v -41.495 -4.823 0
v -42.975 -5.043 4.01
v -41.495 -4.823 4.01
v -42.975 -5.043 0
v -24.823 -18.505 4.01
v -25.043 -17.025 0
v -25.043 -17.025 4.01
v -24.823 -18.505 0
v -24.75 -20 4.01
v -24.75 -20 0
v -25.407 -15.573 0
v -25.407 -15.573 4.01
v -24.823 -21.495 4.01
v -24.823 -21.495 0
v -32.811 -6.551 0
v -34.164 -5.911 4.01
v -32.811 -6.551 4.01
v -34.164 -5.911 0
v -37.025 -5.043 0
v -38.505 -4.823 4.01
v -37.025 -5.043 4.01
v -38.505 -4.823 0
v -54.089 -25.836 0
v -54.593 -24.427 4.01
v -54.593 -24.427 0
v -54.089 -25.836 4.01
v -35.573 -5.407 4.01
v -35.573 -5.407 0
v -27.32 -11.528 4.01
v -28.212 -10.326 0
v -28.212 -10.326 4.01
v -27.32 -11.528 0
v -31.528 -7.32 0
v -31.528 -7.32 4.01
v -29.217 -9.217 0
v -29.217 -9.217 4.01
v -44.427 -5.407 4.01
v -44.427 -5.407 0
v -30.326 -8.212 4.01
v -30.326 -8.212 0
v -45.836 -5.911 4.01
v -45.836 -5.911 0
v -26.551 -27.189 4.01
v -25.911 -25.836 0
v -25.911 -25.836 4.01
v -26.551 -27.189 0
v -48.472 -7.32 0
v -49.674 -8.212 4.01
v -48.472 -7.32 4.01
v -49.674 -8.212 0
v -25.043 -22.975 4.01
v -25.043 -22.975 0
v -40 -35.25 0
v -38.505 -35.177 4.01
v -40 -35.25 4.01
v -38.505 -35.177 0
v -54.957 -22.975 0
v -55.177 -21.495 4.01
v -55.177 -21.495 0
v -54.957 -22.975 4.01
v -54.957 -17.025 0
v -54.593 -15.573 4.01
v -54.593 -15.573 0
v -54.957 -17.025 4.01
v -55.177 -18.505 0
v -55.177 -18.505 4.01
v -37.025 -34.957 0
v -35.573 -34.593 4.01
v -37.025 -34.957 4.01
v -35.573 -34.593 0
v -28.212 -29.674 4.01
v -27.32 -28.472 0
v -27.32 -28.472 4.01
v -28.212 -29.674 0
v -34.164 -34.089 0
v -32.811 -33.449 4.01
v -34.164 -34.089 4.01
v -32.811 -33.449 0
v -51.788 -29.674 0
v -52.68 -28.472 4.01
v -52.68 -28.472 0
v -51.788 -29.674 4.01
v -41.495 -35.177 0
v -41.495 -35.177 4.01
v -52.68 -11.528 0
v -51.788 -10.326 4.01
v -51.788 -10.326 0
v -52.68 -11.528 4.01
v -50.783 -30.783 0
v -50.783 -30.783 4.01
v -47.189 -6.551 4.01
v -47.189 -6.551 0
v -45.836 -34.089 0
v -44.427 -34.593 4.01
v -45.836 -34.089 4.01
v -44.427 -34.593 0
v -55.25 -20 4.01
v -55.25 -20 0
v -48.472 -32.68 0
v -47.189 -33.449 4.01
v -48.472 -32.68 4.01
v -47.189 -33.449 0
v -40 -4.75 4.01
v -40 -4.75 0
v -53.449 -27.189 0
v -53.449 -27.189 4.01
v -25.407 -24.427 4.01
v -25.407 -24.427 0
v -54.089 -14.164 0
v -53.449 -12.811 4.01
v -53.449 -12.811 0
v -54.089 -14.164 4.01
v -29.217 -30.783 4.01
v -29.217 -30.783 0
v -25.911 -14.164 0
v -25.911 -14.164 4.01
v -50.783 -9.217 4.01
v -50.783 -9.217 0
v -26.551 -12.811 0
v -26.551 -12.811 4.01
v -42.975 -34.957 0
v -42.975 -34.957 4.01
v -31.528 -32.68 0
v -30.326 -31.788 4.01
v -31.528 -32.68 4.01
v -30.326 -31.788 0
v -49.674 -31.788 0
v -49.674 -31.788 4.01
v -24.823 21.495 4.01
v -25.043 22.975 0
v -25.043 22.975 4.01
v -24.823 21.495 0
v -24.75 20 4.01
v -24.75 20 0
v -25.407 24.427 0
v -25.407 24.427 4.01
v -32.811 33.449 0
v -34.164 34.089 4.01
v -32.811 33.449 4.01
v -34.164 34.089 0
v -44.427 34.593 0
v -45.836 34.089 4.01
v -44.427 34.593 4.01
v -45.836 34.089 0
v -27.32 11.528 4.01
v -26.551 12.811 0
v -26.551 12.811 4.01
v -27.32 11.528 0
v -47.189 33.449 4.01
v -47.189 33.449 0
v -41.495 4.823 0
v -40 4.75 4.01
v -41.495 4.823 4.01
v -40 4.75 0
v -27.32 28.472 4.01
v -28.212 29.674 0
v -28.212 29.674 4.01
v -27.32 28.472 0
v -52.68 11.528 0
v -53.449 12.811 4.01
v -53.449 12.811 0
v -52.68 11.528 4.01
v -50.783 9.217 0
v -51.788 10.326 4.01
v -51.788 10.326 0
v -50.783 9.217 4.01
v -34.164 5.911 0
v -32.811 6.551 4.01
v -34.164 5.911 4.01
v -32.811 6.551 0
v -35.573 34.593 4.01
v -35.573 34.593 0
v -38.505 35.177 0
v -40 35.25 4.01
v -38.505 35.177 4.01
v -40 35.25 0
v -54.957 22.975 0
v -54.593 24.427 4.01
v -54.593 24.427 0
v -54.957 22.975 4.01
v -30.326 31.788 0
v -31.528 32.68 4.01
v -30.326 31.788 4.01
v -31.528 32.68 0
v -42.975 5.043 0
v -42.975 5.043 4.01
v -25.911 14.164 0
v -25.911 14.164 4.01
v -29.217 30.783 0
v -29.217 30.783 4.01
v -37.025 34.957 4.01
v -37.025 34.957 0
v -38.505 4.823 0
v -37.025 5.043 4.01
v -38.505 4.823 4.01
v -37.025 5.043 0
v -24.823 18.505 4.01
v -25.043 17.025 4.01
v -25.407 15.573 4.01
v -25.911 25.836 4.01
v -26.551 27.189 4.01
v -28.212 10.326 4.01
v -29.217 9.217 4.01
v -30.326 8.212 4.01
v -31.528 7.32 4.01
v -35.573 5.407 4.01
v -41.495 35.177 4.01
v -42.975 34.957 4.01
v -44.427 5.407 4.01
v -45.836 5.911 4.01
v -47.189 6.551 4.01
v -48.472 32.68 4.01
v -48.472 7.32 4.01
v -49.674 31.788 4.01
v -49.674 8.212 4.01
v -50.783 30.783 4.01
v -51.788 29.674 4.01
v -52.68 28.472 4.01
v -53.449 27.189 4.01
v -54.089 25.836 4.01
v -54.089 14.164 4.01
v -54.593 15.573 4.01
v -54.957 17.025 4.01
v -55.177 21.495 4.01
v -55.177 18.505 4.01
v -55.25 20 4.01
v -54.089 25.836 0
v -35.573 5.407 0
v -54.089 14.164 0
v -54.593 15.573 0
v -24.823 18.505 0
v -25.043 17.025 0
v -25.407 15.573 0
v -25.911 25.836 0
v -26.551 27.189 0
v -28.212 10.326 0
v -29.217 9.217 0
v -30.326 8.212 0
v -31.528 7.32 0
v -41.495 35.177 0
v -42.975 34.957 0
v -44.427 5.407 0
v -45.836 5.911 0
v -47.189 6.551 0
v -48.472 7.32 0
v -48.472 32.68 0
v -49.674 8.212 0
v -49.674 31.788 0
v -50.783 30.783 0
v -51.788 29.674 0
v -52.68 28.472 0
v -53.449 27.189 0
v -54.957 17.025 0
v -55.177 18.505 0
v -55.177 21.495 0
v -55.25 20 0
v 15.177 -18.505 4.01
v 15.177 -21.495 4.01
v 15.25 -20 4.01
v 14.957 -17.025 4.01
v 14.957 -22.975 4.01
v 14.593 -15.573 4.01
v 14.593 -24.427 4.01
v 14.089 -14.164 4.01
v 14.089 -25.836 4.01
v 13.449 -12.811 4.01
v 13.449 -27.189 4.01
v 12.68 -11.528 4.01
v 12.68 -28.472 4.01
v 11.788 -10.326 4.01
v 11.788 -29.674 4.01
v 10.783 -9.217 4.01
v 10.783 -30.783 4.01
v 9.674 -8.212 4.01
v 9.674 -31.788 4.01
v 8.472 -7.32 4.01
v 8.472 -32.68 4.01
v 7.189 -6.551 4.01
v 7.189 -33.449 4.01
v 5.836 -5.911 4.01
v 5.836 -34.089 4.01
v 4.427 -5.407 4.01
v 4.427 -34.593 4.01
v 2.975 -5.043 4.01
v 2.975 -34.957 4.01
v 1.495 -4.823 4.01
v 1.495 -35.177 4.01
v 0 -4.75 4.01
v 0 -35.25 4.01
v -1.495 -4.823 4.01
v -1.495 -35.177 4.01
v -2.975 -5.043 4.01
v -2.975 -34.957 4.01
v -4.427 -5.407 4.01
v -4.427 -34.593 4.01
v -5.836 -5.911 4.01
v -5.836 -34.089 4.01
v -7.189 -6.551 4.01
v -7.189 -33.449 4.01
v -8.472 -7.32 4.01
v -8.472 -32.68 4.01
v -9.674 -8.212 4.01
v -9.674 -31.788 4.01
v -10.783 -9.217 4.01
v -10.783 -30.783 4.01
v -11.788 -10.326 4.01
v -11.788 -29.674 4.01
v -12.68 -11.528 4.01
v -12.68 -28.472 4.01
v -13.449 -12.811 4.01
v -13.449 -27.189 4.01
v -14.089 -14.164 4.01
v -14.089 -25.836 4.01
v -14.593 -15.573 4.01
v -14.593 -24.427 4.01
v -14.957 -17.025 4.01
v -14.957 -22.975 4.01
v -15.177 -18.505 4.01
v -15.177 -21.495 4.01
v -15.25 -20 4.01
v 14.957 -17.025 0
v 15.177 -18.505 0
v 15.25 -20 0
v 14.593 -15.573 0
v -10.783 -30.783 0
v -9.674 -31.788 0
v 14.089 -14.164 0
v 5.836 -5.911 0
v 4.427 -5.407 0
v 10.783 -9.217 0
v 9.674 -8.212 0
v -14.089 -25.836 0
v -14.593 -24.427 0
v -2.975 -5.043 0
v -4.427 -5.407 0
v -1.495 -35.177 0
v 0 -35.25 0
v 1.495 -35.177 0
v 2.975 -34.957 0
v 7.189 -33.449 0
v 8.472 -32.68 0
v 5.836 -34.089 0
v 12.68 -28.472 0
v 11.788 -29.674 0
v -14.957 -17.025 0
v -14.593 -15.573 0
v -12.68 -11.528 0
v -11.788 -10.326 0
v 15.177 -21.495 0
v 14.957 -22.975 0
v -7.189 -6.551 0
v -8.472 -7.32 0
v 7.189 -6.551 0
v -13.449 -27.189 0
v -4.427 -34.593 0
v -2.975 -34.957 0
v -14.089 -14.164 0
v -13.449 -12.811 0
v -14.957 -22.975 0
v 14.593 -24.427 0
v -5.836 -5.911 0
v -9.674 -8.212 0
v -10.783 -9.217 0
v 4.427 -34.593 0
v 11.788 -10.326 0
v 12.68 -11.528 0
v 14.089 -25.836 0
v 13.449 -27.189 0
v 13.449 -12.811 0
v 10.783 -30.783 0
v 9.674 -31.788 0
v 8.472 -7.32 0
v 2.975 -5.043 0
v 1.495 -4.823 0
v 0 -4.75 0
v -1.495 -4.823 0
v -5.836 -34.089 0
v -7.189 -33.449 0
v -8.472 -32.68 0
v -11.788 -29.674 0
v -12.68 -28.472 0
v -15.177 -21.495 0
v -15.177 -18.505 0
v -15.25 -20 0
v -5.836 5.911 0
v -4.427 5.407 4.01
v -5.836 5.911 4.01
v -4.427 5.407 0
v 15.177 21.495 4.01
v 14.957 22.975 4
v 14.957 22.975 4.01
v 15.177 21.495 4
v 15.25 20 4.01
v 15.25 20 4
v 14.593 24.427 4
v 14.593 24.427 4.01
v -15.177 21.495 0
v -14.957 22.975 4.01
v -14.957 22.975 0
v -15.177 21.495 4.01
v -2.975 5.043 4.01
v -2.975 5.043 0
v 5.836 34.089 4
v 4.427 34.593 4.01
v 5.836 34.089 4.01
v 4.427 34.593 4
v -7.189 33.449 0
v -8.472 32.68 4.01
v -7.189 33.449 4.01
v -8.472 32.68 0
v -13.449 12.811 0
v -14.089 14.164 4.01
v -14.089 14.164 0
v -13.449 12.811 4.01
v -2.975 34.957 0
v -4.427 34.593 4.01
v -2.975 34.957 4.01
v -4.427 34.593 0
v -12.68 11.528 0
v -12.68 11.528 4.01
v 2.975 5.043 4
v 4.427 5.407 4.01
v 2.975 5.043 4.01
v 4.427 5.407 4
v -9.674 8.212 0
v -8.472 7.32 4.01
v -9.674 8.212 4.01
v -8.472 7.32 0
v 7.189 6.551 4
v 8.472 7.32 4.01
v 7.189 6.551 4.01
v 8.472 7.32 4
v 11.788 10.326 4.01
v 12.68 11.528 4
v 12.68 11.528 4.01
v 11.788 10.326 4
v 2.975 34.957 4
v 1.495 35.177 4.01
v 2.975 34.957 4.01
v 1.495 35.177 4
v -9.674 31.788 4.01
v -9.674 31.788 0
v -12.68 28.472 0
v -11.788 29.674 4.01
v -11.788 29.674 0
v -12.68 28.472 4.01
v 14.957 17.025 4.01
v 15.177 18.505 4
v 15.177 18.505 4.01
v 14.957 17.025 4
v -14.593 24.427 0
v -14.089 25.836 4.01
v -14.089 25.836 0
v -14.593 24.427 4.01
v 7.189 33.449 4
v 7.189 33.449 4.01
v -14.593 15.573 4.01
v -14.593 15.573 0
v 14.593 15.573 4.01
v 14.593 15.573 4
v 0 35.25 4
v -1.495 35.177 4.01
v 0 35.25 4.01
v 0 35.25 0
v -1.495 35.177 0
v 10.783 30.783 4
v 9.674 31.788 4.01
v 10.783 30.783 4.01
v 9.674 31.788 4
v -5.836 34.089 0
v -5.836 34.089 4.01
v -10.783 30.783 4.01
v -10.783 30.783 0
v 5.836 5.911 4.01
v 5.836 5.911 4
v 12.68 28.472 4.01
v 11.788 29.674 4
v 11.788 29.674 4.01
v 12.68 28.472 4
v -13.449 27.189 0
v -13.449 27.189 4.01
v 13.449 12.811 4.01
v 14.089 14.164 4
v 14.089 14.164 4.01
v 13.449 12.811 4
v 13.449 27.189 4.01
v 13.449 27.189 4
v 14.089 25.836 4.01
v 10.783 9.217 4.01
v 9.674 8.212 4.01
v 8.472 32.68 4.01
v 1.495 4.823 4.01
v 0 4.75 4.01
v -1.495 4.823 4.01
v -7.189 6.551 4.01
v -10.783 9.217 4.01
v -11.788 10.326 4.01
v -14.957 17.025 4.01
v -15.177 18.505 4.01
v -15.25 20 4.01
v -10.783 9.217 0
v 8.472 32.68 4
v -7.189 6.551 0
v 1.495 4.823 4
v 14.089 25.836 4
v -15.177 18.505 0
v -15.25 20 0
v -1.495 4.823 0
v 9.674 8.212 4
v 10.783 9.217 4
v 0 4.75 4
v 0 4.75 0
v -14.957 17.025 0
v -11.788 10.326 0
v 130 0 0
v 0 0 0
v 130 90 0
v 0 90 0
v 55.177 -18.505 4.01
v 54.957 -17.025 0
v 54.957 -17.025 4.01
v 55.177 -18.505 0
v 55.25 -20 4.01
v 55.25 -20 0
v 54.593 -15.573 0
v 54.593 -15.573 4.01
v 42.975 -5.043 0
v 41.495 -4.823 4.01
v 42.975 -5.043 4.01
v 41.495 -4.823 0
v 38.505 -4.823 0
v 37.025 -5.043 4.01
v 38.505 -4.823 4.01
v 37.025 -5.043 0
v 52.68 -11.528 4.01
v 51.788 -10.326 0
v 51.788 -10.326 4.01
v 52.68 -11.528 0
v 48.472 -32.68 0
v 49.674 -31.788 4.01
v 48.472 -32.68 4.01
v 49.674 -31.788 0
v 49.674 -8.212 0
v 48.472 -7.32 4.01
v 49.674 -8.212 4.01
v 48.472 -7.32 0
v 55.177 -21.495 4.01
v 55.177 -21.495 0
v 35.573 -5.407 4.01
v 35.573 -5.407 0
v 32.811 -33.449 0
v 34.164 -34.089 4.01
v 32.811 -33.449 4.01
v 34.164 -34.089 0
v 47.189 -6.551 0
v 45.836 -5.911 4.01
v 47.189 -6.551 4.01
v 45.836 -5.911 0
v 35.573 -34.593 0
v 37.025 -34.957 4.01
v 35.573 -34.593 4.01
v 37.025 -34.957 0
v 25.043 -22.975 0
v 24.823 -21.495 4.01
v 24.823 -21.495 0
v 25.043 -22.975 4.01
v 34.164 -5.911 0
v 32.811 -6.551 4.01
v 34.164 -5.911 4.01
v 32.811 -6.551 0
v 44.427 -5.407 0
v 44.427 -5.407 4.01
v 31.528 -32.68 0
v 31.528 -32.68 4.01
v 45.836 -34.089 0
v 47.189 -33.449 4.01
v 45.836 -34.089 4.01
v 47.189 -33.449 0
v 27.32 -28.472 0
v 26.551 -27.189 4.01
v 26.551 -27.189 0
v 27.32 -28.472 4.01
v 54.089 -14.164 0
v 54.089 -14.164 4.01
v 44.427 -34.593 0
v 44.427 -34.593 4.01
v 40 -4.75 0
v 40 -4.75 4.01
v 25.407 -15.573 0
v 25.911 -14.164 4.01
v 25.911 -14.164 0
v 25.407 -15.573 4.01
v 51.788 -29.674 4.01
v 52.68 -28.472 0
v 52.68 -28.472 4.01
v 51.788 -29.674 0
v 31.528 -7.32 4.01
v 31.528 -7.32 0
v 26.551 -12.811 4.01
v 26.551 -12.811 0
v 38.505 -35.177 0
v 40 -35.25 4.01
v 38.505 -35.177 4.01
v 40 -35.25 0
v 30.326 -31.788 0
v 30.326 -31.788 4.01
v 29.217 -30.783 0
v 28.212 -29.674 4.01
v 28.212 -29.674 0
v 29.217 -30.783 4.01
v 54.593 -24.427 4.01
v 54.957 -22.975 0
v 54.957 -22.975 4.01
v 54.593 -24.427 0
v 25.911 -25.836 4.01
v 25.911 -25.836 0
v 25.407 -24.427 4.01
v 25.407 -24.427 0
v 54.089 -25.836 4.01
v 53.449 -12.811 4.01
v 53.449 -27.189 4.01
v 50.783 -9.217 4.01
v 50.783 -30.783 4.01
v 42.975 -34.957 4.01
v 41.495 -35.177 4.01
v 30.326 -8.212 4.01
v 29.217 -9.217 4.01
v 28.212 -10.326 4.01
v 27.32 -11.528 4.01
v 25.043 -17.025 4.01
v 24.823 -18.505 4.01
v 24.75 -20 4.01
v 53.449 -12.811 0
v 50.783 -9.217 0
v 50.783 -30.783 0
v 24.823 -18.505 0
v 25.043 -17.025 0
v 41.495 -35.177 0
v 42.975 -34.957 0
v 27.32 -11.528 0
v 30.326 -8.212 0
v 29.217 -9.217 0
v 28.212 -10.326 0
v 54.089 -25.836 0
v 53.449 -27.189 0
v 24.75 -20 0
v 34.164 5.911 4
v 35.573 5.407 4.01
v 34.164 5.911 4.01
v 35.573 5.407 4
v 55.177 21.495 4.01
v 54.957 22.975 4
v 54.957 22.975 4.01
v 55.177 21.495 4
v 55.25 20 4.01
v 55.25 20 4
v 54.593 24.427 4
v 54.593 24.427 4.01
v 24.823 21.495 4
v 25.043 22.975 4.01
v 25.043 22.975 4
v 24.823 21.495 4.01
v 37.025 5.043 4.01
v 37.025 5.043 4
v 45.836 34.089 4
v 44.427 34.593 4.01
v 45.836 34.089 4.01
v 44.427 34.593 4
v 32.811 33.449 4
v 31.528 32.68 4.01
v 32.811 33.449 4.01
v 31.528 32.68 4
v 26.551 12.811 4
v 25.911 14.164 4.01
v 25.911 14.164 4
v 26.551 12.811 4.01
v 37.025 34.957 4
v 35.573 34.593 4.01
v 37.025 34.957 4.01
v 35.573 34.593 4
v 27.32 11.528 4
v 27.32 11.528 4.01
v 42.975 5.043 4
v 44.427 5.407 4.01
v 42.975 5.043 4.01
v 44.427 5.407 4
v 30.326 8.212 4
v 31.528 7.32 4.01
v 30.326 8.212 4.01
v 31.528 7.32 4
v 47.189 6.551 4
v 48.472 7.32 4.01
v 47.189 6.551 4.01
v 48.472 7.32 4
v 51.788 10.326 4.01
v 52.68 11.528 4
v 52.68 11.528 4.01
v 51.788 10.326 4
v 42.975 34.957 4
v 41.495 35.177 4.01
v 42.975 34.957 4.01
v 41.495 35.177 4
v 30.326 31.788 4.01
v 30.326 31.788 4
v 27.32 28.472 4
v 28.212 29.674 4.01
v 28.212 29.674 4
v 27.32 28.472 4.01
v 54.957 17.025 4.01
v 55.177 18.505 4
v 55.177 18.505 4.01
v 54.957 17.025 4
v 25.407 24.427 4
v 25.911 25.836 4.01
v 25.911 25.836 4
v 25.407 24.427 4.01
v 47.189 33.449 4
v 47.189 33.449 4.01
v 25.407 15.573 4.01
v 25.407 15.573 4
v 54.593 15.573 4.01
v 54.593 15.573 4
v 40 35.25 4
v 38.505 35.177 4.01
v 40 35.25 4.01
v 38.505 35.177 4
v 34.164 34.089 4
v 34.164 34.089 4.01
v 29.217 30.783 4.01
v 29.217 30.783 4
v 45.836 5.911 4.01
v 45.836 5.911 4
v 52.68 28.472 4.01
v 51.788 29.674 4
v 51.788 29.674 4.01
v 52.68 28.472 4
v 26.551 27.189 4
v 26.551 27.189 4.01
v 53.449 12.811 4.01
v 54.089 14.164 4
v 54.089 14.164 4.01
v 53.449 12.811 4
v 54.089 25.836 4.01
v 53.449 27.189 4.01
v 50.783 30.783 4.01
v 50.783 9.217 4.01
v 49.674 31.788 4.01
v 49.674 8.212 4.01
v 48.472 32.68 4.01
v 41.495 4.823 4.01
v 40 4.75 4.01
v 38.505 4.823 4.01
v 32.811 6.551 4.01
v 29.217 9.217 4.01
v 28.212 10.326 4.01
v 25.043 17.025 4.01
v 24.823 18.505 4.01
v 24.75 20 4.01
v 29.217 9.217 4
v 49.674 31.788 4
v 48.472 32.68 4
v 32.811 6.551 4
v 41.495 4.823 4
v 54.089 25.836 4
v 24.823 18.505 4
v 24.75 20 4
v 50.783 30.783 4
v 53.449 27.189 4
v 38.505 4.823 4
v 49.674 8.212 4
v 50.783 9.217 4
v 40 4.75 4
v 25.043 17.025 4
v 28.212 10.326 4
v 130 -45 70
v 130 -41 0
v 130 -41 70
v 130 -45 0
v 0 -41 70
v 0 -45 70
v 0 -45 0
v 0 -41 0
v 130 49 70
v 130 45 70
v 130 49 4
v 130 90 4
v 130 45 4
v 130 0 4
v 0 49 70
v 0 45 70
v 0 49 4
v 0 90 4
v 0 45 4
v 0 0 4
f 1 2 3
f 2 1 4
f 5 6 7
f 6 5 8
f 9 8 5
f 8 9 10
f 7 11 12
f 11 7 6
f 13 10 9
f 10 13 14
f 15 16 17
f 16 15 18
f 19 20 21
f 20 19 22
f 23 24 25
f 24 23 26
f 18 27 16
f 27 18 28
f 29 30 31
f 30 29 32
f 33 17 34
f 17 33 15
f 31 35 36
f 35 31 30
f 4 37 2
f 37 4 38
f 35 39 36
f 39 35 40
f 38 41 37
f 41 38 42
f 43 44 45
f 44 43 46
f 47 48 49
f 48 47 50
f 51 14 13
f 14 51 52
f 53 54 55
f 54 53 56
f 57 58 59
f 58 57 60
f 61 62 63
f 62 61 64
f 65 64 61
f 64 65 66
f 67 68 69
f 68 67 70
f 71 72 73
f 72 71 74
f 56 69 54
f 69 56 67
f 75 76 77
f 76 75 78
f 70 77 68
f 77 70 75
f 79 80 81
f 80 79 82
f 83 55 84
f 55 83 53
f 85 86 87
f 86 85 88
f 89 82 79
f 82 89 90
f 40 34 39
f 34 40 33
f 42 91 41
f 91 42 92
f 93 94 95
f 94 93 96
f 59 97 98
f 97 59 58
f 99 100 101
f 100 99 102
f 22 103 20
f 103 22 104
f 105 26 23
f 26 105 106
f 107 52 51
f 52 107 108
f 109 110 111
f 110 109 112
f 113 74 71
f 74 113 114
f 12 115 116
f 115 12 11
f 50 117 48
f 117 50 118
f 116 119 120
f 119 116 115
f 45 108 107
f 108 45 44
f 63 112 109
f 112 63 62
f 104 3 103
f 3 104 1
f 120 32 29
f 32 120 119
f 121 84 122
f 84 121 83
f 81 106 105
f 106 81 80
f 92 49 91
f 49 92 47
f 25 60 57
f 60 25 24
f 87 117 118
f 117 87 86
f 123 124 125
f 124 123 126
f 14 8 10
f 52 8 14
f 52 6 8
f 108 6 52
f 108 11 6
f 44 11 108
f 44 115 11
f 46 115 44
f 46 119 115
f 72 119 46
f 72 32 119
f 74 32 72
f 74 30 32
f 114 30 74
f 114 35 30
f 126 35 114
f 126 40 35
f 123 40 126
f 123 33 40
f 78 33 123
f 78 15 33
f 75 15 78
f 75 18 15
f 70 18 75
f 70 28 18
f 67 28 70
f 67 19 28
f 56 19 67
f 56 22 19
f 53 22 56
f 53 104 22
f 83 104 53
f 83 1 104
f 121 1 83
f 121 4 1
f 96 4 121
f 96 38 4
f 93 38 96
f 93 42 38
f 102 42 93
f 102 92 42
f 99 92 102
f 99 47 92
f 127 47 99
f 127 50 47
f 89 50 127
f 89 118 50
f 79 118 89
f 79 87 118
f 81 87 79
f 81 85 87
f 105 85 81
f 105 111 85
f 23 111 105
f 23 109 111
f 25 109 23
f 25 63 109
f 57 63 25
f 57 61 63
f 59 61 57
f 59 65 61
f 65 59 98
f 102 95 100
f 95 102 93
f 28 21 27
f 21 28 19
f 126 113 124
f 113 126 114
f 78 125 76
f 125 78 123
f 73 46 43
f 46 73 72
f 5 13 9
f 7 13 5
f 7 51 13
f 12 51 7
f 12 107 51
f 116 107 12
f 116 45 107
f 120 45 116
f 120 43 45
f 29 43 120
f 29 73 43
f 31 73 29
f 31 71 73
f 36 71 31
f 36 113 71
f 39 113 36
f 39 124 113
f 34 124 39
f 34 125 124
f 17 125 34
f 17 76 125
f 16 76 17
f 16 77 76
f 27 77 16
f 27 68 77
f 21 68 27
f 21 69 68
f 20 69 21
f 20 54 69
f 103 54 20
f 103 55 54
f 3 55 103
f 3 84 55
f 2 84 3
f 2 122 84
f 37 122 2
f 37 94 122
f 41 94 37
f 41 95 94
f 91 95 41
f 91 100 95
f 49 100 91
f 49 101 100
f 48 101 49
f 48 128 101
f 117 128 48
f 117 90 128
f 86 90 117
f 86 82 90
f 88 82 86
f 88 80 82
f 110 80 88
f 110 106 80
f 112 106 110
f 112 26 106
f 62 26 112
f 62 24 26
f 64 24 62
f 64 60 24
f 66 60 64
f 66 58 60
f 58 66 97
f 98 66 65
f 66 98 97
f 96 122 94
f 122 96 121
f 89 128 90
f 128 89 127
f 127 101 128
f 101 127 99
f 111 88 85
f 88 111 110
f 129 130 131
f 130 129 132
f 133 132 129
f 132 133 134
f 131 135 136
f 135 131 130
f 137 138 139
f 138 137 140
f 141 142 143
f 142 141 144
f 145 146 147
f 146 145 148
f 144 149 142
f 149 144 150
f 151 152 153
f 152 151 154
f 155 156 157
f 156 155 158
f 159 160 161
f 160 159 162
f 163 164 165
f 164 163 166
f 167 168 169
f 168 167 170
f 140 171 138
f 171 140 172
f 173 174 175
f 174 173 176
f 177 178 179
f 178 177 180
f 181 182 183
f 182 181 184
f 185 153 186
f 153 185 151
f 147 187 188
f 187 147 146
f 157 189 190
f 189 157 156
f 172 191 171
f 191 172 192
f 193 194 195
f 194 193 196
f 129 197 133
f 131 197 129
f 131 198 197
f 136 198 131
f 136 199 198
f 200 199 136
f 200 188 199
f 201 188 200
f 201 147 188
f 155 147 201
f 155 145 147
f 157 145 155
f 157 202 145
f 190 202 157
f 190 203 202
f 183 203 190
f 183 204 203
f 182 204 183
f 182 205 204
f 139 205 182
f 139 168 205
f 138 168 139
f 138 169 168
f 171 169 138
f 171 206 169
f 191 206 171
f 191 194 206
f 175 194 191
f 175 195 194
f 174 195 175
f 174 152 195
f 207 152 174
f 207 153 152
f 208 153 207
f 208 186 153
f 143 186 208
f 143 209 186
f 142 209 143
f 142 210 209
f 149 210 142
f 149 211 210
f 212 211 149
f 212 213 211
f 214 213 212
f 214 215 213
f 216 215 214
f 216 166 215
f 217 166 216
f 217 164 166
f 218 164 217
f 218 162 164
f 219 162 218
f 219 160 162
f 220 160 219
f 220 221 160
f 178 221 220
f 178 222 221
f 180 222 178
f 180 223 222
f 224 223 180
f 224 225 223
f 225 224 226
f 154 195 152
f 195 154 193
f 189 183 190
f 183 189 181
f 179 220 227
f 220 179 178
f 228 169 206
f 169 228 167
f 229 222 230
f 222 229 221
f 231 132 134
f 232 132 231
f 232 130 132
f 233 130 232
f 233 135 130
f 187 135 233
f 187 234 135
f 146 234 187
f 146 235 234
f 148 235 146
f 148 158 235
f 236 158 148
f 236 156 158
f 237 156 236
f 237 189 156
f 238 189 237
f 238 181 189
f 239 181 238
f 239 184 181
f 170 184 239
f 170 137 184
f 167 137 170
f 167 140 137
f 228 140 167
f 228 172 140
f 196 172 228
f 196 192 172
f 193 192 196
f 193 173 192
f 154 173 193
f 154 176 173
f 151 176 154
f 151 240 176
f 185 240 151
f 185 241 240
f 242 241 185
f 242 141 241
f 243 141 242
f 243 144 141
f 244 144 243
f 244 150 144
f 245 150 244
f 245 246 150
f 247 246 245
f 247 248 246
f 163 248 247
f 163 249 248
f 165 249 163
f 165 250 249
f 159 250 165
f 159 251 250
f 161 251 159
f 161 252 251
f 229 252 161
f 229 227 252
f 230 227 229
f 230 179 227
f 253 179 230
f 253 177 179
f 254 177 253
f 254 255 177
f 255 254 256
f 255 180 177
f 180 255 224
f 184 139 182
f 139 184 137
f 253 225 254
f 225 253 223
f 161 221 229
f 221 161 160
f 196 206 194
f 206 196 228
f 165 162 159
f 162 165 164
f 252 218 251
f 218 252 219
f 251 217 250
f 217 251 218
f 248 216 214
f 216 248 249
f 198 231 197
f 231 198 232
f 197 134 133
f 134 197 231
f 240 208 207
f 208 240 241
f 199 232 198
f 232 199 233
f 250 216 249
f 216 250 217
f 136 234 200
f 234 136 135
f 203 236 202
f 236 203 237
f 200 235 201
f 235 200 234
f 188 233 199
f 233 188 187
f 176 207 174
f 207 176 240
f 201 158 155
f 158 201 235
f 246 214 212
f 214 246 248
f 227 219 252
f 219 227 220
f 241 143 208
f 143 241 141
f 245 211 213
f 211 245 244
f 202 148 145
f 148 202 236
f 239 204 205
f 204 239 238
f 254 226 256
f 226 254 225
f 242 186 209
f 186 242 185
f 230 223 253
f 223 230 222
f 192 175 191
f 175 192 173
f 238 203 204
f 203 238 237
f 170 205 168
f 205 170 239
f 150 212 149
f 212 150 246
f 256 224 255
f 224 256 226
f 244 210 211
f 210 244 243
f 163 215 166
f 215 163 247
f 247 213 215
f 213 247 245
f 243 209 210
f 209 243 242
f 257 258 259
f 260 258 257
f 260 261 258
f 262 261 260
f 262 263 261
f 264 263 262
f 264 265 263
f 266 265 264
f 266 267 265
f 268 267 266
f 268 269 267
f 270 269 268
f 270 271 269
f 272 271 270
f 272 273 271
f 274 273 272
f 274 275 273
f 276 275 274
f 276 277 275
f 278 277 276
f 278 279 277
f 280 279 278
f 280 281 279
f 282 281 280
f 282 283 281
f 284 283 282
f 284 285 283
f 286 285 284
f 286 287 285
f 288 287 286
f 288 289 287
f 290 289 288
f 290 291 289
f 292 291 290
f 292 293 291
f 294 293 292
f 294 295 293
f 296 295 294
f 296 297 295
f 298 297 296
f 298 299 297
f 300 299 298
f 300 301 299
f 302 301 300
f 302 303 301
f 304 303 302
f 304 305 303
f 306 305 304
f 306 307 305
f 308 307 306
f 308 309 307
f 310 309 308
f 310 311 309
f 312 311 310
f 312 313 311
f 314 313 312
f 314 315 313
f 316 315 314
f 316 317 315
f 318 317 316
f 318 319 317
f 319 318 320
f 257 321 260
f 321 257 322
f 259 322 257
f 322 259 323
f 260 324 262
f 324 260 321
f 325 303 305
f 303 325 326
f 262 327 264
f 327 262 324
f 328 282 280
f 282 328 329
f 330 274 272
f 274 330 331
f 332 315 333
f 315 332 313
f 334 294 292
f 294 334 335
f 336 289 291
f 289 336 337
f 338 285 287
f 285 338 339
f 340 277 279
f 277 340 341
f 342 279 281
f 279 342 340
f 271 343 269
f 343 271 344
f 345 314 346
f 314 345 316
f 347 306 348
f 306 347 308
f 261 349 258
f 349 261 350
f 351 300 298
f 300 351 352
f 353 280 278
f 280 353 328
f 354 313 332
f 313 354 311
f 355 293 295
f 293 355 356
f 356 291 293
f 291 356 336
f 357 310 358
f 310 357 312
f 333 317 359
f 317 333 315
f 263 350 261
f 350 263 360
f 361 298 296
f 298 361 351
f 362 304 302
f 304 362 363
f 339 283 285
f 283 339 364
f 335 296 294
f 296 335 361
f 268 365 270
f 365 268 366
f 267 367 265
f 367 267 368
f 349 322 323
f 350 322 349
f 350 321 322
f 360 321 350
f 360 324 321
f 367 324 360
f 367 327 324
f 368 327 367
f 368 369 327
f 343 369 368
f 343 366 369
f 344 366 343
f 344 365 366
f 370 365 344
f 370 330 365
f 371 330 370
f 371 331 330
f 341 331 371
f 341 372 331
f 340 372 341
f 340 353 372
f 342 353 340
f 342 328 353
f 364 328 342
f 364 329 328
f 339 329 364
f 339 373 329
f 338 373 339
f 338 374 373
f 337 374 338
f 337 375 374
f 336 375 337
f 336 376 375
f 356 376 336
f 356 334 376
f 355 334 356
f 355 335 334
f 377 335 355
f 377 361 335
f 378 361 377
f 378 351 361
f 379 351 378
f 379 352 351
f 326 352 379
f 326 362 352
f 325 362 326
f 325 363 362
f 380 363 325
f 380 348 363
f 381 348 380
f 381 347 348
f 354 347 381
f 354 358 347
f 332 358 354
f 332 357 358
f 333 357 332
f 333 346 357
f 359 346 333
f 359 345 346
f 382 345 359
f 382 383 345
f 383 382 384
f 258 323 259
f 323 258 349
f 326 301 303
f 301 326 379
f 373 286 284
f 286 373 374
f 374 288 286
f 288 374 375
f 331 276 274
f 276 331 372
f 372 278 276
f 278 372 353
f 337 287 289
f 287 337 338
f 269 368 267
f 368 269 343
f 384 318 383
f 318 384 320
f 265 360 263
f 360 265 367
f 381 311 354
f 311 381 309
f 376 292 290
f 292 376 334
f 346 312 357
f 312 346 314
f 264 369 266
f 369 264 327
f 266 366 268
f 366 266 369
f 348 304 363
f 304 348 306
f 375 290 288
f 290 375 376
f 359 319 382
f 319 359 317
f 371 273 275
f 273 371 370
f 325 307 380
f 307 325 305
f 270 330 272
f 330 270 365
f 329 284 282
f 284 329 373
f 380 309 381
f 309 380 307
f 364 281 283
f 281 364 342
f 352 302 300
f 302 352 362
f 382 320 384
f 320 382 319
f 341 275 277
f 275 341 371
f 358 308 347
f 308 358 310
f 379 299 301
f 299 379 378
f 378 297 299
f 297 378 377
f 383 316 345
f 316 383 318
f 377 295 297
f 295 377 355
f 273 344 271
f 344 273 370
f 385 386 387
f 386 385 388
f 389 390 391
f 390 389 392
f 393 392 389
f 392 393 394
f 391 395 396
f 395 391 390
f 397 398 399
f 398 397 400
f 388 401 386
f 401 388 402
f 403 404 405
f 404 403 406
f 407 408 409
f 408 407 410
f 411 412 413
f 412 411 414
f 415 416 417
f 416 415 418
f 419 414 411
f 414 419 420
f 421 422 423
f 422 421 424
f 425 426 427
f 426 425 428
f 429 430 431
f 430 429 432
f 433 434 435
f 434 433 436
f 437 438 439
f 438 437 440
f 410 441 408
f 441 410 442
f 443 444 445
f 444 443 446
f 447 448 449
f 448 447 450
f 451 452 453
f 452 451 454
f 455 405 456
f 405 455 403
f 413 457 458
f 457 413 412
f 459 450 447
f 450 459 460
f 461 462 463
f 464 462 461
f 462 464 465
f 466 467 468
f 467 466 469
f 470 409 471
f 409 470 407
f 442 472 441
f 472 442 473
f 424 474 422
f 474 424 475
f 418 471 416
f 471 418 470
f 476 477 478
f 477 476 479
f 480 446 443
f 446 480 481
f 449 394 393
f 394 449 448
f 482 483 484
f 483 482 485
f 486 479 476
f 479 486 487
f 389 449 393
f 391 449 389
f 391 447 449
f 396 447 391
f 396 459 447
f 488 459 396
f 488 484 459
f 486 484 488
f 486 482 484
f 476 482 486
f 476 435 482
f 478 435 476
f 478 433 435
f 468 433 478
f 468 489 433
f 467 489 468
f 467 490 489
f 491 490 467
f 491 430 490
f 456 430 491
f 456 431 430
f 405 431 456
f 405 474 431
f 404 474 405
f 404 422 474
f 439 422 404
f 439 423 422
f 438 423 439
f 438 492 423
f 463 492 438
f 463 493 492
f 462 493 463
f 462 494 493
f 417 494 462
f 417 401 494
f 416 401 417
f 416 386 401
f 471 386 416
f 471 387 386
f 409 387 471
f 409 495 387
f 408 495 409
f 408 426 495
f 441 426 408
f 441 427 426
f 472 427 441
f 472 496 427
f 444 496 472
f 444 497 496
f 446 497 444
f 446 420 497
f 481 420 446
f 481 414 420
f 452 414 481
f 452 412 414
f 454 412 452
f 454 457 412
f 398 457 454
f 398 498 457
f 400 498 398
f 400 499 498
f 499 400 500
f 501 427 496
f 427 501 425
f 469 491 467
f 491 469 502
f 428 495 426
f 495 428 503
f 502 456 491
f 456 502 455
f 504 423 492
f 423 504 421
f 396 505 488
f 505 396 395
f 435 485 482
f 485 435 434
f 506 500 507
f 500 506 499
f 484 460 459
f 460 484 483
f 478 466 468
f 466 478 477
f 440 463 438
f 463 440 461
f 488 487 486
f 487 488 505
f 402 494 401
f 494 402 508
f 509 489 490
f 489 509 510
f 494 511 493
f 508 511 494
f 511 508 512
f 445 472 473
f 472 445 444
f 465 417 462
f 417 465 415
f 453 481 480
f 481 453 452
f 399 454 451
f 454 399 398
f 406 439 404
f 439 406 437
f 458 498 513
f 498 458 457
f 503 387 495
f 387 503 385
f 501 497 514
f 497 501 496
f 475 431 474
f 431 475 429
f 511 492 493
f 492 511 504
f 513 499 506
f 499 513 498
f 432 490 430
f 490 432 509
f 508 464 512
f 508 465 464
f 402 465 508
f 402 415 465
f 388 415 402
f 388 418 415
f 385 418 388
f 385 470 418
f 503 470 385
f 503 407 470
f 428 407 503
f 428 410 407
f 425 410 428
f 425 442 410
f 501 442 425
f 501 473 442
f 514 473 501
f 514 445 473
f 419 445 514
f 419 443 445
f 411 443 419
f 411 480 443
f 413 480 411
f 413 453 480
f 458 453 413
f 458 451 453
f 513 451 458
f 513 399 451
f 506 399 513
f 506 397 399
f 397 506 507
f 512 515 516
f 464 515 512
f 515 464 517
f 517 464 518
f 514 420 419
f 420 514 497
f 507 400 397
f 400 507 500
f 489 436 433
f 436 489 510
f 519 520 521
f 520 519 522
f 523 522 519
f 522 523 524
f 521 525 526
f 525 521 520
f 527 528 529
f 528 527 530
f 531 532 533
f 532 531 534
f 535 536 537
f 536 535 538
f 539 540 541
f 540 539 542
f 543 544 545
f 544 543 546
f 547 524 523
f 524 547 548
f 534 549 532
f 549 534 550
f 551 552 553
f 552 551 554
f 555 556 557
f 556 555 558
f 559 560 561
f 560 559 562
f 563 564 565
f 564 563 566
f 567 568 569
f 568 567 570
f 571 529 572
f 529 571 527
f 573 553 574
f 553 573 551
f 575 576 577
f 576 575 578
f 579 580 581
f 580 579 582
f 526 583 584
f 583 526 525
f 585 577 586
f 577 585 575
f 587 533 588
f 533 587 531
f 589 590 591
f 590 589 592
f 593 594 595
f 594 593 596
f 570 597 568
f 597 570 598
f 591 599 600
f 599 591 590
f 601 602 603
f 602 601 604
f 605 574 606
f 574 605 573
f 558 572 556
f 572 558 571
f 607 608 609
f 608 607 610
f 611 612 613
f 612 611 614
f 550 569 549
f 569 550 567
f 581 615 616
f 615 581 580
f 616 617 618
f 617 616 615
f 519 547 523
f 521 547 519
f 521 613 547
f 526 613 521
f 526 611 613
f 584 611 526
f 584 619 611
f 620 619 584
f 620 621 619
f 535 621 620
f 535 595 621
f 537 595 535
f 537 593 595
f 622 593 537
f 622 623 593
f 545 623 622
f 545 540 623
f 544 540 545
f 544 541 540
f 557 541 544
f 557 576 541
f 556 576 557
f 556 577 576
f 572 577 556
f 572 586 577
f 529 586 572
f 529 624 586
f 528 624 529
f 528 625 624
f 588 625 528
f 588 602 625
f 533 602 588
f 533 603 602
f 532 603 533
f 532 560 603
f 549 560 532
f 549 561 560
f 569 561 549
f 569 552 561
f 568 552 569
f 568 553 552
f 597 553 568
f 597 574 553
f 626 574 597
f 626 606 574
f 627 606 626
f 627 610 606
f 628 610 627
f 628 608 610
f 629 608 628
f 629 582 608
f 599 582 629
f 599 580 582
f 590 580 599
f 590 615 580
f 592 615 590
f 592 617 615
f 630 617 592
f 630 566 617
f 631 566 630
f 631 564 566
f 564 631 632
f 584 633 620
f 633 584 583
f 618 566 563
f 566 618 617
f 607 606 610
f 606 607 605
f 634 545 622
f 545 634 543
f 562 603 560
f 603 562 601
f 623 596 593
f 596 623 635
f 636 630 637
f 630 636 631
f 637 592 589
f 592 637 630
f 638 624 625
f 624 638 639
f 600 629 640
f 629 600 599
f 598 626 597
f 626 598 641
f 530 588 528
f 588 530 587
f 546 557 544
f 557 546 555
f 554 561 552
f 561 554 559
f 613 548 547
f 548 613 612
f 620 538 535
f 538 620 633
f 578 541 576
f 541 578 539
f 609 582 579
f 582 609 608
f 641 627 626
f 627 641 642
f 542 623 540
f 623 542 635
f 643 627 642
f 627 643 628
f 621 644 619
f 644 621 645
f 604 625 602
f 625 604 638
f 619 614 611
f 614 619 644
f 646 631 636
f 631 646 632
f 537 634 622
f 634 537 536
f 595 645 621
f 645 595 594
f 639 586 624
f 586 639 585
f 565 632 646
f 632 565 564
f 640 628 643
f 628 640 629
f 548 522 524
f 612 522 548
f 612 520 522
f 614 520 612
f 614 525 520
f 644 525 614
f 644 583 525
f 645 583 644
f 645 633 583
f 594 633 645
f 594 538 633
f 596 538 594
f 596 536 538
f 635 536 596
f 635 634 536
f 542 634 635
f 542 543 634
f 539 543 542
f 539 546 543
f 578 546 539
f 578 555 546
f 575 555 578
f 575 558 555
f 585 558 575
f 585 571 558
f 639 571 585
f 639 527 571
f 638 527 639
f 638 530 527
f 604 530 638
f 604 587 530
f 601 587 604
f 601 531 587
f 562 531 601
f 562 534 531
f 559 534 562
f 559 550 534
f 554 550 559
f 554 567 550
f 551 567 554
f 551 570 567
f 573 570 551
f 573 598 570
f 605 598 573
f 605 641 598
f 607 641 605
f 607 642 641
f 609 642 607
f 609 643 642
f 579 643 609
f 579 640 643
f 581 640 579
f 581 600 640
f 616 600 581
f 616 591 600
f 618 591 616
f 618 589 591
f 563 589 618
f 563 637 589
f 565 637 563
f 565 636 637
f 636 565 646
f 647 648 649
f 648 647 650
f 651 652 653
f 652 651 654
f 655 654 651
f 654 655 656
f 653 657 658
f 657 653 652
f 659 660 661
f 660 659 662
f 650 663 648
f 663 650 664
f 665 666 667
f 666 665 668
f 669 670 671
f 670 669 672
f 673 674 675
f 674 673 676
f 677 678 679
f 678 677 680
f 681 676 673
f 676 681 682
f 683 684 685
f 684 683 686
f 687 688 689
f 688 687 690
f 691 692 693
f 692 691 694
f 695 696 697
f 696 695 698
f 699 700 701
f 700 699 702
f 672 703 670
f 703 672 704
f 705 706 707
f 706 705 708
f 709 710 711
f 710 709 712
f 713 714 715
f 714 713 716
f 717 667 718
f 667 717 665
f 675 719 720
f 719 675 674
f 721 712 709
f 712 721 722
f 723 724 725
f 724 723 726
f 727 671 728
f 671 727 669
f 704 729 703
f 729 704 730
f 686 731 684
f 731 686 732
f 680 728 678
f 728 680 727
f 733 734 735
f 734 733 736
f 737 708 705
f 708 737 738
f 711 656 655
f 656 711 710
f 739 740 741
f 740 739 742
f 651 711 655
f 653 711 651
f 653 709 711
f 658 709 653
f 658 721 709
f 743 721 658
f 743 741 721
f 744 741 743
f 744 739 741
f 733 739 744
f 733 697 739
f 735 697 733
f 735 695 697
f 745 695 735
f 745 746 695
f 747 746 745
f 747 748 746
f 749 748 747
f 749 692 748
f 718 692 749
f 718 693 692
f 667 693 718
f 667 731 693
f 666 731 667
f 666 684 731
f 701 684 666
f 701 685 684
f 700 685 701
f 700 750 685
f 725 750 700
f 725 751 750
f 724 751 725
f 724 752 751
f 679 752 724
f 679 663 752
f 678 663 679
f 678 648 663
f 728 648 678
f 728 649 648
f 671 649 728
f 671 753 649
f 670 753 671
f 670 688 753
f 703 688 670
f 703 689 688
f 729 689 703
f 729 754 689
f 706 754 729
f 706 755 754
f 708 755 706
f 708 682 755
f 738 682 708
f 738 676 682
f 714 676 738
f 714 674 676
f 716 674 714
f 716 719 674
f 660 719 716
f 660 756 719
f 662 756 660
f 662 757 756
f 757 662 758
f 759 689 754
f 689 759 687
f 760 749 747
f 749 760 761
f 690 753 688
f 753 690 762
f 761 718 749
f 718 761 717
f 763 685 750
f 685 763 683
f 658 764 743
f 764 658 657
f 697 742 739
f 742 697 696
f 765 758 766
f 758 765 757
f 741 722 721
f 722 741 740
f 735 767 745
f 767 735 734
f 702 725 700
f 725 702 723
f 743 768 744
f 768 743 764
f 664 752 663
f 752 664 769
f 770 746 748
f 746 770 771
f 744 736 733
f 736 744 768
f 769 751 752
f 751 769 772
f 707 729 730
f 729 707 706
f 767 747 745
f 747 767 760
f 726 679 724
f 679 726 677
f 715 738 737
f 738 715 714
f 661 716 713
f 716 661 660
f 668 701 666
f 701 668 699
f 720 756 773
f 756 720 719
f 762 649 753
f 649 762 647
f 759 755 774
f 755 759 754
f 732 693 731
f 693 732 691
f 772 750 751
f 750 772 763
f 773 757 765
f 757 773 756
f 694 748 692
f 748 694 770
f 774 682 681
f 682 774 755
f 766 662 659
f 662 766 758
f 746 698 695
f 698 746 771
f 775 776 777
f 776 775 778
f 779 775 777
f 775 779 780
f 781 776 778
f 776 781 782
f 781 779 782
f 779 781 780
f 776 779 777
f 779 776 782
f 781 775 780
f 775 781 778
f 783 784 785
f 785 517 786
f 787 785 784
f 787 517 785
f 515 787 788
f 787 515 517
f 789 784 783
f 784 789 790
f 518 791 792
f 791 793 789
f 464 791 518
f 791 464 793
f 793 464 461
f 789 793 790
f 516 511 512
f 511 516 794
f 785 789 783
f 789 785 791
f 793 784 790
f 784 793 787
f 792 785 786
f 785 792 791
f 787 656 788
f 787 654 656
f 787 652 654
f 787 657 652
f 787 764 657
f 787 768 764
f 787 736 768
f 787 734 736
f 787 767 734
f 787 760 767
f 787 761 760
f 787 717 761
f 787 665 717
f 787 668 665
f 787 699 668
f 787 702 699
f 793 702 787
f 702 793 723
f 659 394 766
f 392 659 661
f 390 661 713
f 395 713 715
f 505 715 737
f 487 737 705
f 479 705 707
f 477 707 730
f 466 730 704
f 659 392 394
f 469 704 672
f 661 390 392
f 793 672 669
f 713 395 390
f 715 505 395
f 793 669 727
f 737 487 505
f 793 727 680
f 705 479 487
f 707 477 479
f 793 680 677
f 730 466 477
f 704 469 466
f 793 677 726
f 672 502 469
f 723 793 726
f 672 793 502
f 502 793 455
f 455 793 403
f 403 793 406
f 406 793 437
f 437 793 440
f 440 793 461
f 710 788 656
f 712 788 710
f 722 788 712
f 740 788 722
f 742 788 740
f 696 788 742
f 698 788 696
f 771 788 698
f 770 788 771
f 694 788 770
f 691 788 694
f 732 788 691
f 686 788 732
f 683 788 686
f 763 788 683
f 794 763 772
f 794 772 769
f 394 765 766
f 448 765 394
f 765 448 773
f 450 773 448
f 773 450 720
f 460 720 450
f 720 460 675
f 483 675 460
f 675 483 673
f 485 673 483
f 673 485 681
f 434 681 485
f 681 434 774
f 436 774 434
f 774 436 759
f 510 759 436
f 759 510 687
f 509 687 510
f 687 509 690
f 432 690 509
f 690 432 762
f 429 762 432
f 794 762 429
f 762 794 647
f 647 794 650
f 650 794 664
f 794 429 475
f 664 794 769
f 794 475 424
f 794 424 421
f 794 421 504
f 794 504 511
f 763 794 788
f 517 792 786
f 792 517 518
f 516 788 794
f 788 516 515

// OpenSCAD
$fn = 64;

// Plate Dimensions
plate_length_x = 130;
plate_width_y = 90;
plate_thickness_z = 4;

// Tube Rack Dimensions
hole_diameter = 30.5;
grid_cols = 3;
grid_rows = 2;
spacing = 40;

// Wall Dimensions
wall_length_x = 130;
wall_thickness_y = 4;
wall_height_z = 70;

// Calculate hole positions
// Center the grid on the plate
x_offsets = [for (i = [0 : grid_cols - 1]) (i - (grid_cols - 1) / 2) * spacing];
y_offsets = [for (j = [0 : grid_rows - 1]) (j - (grid_rows - 1) / 2) * spacing];

module base_plate() {
    cube([plate_length_x, plate_width_y, plate_thickness_z]);
}

module holes() {
    for (x = x_offsets) {
        for (y = y_offsets) {
            // Extrude slightly past the top face to ensure clean cut
            translate([x, y, 0])
            cylinder(r = hole_diameter / 2, h = plate_thickness_z + 0.01, $fn = 64);
        }
    }
}

module walls() {
    // Wall 1 (Back/Left edge)
    // Centered on y = -plate_width_y / 2
    translate([0, -plate_width_y / 2, 0])
    cube([wall_length_x, wall_thickness_y, wall_height_z]);

    // Wall 2 (Front/Right edge)
    // Centered on y = +plate_width_y / 2
    translate([0, plate_width_y / 2, 0])
    cube([wall_length_x, wall_thickness_y, wall_height_z]);
}

union() {
    base_plate();
    holes();
    walls();
}
